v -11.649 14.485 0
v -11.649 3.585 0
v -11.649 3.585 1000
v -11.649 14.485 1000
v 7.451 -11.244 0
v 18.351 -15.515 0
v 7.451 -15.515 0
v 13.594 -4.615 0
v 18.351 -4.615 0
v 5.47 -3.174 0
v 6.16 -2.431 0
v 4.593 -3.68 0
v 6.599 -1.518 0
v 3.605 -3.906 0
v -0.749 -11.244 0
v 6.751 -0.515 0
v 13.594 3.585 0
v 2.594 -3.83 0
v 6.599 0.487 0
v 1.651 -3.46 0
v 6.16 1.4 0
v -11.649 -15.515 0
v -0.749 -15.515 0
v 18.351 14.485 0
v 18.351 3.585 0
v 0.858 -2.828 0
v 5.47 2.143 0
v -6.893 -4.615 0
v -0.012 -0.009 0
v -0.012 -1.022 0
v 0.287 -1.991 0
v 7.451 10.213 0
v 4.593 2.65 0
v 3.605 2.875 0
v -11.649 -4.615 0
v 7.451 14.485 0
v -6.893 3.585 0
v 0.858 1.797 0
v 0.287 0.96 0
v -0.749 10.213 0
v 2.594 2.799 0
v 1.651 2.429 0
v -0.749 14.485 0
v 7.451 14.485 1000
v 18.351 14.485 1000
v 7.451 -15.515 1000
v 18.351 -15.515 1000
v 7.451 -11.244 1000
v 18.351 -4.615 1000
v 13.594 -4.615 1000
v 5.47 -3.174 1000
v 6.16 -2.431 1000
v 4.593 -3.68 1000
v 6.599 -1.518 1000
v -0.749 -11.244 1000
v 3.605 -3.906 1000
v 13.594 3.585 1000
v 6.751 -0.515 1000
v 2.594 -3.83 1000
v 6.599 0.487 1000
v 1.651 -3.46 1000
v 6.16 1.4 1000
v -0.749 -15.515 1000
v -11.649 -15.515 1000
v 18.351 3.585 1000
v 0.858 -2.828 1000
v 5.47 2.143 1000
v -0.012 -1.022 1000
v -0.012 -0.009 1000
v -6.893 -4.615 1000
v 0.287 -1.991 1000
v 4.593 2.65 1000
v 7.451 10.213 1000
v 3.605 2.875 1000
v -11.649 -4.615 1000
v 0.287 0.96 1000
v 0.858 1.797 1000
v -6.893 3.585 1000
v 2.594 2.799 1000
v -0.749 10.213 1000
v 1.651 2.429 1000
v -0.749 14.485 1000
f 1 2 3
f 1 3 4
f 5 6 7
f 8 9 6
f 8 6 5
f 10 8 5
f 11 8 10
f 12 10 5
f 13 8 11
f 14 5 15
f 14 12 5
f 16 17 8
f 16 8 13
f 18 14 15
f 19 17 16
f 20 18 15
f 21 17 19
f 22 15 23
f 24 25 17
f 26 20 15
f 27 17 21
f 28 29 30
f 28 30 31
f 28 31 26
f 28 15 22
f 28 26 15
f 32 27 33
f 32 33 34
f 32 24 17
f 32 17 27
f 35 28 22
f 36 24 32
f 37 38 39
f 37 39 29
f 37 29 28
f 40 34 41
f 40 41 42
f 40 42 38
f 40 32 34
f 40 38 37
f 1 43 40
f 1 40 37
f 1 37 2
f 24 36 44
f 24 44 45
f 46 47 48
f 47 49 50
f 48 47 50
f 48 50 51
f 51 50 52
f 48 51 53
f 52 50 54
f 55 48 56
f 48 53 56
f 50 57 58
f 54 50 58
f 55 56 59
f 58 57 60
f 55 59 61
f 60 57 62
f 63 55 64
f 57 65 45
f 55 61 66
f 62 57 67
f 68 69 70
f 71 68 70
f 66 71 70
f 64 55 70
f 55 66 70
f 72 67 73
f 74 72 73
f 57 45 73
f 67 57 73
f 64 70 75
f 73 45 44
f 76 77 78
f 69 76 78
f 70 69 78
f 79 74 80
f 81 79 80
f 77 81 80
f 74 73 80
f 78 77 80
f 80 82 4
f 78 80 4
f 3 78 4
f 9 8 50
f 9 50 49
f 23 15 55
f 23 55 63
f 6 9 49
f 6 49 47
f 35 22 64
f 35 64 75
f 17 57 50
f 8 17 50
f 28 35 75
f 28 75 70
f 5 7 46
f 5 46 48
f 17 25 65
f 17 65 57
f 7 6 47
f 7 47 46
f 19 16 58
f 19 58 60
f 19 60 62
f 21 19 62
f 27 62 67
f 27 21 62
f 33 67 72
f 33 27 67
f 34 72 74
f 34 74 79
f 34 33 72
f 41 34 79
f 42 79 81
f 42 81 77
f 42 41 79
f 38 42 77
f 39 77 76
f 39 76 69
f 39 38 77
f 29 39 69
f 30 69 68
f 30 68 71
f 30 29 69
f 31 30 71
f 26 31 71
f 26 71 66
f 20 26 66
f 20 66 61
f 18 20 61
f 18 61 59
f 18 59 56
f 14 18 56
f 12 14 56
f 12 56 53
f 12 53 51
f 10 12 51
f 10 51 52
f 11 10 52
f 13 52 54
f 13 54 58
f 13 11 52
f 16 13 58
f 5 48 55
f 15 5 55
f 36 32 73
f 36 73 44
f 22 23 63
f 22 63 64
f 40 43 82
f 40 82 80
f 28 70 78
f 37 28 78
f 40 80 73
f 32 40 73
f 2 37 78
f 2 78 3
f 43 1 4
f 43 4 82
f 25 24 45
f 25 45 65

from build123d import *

# Parameters (mm, degrees)
SKETCH_1_R      = 3.4
EXTRUDE_1_DEPTH = 1000


with BuildPart() as part:
    # 草图1 → 凸台-拉伸1 (new body)
    with BuildSketch(Plane.XY):
        Polygon((-11.649484536, 14.484536082), (-0.749484536, 14.484536082), (-0.749484536, 10.213414009), (7.450515464, 10.213414009), (7.450515464, 14.484536082), (18.350515464, 14.484536082), (18.350515464, 3.584536082), (13.594038609, 3.584536082), (13.594038609, -4.615463918), (18.350515464, -4.615463918), (18.350515464, -15.515463918), (7.450515464, -15.515463918), (7.450515464, -11.244341844), (-0.749484536, -11.244341844), (-0.749484536, -15.515463918), (-11.649484536, -15.515463918), (-11.649484536, -4.615463918), (-6.893007681, -4.615463918), (-6.893007681, 3.584536082), (-11.649484536, 3.584536082), align=None)
        with Locations((3.350515464, -0.515463918)):
            Circle(SKETCH_1_R, mode=Mode.SUBTRACT)
    extrude(amount=EXTRUDE_1_DEPTH)


solid = part.part
